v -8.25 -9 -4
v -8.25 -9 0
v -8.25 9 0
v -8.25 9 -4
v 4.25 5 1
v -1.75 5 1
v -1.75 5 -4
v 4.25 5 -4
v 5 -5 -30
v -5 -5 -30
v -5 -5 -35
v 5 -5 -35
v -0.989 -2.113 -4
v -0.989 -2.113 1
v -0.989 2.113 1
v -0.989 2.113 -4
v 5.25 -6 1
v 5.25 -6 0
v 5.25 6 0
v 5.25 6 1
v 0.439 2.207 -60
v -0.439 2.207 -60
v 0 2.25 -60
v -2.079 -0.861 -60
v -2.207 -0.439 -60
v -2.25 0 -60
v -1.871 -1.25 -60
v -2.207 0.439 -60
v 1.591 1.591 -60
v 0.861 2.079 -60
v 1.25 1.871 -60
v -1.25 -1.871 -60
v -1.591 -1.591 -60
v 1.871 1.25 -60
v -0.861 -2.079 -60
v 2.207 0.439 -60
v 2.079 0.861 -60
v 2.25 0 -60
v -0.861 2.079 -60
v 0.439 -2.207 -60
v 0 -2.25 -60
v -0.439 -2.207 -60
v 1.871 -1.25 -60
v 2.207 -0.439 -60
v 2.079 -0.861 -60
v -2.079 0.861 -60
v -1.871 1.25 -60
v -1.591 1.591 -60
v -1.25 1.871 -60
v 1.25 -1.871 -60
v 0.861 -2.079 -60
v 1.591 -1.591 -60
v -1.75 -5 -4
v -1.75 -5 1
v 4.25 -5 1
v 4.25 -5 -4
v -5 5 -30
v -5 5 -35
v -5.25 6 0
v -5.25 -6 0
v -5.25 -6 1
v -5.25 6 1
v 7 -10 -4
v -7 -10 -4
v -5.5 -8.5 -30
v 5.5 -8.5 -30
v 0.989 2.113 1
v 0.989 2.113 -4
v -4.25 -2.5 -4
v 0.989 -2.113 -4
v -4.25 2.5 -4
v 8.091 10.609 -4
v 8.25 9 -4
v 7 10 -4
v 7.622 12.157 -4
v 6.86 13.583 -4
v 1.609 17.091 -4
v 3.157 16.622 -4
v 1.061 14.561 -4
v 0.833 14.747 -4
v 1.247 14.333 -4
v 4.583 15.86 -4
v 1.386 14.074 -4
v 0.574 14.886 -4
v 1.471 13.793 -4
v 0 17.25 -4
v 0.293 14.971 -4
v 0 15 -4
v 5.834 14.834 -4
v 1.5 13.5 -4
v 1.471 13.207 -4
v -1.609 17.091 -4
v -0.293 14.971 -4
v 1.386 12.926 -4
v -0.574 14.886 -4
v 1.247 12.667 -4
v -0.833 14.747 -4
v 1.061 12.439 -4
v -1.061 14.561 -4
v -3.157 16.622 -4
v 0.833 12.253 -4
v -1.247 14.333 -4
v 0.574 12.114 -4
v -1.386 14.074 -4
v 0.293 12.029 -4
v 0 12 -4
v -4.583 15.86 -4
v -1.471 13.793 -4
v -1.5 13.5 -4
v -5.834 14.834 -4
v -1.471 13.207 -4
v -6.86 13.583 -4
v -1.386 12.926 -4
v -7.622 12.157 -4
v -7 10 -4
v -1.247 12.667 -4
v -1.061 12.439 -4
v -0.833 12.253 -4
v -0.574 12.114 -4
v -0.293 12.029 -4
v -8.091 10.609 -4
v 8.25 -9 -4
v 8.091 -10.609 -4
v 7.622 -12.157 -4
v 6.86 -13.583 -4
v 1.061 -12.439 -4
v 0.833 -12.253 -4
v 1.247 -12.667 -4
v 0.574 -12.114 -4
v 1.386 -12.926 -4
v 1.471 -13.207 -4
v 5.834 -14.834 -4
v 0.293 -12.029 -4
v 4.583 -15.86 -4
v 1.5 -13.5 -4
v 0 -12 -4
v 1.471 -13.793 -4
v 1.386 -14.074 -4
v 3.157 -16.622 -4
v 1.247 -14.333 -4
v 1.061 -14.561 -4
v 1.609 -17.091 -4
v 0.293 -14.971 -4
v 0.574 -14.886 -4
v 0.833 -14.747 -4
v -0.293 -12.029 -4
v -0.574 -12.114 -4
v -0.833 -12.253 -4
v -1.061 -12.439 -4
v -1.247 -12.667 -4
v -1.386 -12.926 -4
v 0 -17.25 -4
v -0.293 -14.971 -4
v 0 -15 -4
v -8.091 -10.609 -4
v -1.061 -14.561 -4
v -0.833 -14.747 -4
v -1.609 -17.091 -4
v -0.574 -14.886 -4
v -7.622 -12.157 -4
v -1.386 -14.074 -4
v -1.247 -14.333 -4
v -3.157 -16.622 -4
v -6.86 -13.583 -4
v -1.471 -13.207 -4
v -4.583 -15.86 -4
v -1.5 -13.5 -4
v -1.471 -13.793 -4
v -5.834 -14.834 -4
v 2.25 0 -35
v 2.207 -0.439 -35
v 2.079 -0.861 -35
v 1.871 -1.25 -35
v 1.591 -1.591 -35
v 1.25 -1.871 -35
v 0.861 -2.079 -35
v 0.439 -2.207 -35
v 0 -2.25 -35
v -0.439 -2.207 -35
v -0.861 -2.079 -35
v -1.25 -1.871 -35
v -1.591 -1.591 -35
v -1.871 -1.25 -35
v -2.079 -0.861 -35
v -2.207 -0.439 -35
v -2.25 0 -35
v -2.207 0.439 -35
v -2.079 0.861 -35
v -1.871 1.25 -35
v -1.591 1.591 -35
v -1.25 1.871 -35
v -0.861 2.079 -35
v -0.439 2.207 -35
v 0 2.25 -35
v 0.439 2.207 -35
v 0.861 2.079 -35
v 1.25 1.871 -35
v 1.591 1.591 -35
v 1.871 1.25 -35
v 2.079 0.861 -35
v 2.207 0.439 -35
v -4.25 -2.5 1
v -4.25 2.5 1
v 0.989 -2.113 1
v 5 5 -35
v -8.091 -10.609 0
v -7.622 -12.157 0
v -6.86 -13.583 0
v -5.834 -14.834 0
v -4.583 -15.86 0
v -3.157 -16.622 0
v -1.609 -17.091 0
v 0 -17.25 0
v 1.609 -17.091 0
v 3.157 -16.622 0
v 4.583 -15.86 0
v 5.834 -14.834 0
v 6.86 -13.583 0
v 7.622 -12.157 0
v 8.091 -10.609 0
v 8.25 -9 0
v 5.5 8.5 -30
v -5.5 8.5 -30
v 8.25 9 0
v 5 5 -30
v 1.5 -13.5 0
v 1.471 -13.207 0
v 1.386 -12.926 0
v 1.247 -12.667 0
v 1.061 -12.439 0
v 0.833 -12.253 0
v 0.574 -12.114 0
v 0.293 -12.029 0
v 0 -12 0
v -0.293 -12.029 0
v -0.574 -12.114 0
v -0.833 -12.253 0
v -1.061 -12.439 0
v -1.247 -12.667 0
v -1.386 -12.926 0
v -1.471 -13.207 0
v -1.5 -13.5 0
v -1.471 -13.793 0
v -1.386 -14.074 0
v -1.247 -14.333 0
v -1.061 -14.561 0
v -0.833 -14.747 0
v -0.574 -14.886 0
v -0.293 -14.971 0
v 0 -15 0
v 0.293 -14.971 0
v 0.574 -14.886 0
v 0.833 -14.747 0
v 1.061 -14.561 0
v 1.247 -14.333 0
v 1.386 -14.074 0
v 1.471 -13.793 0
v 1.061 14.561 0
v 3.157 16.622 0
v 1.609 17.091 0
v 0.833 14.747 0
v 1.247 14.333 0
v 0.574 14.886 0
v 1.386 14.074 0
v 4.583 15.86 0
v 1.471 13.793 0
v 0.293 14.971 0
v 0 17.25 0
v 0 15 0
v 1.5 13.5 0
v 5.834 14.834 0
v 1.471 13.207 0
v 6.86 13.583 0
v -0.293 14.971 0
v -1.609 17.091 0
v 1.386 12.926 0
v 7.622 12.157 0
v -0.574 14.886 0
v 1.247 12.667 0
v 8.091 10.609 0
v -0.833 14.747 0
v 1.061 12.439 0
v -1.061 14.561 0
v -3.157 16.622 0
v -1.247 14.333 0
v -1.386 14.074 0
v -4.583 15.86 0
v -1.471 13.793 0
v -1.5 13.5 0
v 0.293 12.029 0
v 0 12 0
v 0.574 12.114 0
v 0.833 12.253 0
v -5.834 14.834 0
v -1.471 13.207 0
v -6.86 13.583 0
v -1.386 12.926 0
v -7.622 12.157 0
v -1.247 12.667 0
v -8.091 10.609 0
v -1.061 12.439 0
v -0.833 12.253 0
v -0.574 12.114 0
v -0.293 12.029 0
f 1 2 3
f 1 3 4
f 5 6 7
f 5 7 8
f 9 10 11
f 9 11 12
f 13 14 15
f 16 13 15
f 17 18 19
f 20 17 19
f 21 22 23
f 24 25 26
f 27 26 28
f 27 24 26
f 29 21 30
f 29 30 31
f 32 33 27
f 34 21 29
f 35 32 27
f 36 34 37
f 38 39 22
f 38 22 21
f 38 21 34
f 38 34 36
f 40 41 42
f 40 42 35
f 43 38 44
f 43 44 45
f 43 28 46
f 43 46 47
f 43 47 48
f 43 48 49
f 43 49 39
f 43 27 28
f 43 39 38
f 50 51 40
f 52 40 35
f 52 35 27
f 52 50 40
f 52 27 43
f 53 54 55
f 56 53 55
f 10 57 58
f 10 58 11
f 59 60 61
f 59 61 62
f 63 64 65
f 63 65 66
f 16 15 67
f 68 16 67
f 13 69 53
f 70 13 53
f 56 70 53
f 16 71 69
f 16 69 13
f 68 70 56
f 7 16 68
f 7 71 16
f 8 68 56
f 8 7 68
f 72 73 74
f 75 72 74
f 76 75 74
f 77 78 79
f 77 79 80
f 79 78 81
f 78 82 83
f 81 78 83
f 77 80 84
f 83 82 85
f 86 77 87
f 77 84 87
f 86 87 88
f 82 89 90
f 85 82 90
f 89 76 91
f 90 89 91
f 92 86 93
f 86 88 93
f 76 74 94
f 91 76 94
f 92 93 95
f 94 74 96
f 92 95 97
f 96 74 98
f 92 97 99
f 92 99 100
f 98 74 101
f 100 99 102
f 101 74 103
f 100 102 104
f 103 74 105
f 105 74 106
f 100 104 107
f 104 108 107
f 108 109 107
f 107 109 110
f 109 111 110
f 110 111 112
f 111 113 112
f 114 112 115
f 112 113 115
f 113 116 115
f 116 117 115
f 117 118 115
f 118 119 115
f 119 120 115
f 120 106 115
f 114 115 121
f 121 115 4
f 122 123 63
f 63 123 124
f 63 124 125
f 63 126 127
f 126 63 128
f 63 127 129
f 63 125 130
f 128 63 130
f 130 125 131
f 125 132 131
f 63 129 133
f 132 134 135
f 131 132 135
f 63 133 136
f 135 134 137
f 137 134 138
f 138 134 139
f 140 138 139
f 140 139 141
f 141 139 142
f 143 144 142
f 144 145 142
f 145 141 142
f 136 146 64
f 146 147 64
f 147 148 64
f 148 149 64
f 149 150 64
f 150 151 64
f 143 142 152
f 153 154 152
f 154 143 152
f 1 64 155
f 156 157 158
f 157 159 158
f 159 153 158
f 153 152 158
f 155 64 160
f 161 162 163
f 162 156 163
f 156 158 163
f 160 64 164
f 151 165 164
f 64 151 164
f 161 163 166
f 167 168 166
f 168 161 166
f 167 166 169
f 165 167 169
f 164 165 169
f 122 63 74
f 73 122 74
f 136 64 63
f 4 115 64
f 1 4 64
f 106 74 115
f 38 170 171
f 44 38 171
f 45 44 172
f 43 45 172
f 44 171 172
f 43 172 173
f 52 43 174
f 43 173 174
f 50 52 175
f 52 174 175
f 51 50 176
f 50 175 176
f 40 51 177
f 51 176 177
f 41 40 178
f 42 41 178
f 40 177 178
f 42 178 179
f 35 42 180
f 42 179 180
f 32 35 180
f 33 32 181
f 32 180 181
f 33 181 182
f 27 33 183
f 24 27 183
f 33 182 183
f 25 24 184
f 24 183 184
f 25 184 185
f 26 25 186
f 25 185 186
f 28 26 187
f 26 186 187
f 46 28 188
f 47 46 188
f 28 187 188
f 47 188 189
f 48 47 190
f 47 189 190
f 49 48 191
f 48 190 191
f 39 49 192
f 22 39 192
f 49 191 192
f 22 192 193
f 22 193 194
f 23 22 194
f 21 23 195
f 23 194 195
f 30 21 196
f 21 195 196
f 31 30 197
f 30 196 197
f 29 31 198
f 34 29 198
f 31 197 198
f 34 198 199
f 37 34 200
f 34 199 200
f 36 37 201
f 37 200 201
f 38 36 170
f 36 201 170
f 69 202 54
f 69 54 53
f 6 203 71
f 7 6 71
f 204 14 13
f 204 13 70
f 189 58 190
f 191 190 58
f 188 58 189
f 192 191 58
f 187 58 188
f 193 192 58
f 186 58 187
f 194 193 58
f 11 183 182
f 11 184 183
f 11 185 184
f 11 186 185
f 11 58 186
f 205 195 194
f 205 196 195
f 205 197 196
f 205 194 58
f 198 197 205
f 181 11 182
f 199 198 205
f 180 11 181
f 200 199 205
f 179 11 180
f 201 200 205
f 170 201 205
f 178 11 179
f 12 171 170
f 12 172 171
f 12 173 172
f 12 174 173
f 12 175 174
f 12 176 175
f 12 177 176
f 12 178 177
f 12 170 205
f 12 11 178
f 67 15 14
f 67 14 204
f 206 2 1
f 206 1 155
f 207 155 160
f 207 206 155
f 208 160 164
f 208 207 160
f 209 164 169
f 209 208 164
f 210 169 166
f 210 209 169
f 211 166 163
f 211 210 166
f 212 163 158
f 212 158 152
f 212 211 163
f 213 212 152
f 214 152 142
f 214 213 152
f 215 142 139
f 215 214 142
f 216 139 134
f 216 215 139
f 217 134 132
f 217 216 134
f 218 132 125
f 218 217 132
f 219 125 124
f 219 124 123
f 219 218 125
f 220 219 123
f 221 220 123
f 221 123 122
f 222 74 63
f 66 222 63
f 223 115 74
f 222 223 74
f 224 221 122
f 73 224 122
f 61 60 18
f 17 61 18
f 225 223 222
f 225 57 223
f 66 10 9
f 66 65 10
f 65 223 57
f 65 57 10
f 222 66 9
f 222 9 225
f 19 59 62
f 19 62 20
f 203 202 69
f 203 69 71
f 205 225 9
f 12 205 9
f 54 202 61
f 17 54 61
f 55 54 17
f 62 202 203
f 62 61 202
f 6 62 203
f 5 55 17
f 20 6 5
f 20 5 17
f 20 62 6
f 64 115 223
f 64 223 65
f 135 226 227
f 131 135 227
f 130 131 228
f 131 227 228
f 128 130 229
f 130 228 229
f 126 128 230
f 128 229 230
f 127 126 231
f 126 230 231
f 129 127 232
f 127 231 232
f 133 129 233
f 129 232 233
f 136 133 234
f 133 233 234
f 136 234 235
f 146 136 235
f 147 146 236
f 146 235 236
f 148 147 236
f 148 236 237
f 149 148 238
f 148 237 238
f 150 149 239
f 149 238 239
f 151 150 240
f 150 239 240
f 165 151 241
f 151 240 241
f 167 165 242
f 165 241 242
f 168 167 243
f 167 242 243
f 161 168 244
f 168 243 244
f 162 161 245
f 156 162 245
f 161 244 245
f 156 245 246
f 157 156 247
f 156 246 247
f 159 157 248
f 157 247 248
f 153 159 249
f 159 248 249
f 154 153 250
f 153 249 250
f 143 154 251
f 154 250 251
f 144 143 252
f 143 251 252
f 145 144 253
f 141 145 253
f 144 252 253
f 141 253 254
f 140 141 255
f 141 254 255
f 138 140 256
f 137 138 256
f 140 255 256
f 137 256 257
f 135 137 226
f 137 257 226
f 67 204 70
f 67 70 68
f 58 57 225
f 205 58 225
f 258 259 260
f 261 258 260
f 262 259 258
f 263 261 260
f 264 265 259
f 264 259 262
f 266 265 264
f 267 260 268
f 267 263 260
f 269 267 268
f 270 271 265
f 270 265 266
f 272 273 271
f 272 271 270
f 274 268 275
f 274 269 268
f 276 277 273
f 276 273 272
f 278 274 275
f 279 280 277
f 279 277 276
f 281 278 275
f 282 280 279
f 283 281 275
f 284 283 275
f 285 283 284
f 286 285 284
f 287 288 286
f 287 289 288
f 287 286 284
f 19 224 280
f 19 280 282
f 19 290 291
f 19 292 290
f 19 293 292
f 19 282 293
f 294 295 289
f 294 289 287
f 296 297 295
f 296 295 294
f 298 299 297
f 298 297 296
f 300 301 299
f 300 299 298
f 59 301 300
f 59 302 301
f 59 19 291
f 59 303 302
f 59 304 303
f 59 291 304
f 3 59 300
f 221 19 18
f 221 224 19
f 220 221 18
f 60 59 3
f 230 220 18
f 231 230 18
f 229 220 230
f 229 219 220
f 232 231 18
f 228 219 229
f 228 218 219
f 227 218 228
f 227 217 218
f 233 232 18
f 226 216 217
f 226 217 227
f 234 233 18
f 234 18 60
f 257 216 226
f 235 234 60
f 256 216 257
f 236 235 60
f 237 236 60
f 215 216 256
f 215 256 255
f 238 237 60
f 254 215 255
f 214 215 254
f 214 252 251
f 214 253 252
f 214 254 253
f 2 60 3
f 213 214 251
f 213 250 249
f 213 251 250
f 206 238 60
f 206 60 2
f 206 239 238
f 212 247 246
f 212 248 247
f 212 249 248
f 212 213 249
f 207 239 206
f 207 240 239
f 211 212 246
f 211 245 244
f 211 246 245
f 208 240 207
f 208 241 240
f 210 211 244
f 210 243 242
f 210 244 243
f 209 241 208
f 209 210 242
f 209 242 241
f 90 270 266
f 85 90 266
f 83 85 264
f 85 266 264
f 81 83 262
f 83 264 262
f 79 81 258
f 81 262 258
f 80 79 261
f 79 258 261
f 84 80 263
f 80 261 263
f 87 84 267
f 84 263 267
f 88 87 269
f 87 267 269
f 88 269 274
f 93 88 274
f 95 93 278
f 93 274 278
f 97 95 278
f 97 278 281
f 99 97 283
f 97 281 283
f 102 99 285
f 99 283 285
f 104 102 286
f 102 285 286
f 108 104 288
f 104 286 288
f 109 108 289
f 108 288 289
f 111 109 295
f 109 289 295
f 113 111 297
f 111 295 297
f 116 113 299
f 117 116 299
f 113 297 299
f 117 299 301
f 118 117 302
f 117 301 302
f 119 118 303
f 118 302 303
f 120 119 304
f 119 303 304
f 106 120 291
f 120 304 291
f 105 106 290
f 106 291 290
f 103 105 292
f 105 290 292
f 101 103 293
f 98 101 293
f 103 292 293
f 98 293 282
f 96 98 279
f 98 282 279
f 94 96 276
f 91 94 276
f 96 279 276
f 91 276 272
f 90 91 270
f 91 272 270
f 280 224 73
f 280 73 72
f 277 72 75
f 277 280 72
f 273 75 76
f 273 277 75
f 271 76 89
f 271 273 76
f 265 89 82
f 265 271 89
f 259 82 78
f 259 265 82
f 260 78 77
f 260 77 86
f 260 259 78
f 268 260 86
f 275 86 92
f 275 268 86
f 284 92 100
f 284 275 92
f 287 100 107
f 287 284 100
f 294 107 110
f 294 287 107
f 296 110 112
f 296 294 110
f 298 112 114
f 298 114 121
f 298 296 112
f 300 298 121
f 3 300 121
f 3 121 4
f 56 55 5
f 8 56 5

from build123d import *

# Parameters (mm, degrees)
F0_R      = 1.5
F1_DEPTH  = 4
F2_W      = 14
F2_H      = 20
F3_DEPTH  = 26
F4_SIZE2  = 25.99999
F4_SIZE   = 1.49999
F5_W      = 10
F5_H      = 10
F6_DEPTH  = 5
F7_R      = 2.25
F8_DEPTH  = 25
F9_DEPTH  = 18
F10_W     = 10.5
F10_H     = 12
F11_DEPTH = 1
F13_W     = 8.5
F13_H     = 10
F13_W_2   = 1.9773303065
F13_H_2   = 4.2267278768
F14_DEPTH = 5
F15_SIZE  = 2.5


# Not quite as in the source:
# - a fillet or chamfer is up to 0.001 mm smaller than in the source, because OpenCascade refuses the exact size
# - a feature names something its author has since deleted; it is built from what else it names


with BuildPart() as f1:
    # F0 (on Top) → F1 (new body)
    with BuildSketch(Plane.XY):
        with BuildLine():
            Line((-8.25, 9), (8.25, 9))
            ThreePointArc((8.25, 9), (0, 17.25), (-8.25, 9))
        make_face()
        with Locations((0, 13.5)):
            Circle(F0_R, mode=Mode.SUBTRACT)
    extrude(amount=-F1_DEPTH)



with BuildPart() as f1b:
    # F0 (on Top) → F1, piece 2 (new body)
    with BuildSketch(Plane.XY):
        with BuildLine():
            ThreePointArc((-8.25, -9), (0, -17.25), (8.25, -9))
            Line((8.25, -9), (-8.25, -9))
        make_face()
        with Locations((0, -13.5)):
            Circle(F0_R, mode=Mode.SUBTRACT)
    extrude(amount=-F1_DEPTH)


with BuildPart() as f1_1:
    add(f1.part)

    add(f1b.part)  # F3 merges F1b
    # F2 (on face) → F3 (join)
    with BuildSketch(Plane(origin=(0, 0, -4), x_dir=(1, 0, 0), z_dir=(0, 0, -1))):
        Rectangle(F2_W, F2_H)
    extrude(amount=F3_DEPTH)

    # F4 (size 1.5 and 26 in the source; OpenCascade refuses exactly that, so slightly less here)
    f4_edges = [f1_1.edges().sort_by_distance(p)[0] for p in [
        (0, -10, -30),
        (0, 10, -30),
        (7, 0, -30),
        (-7, 0, -30),
    ]]
    f4_side = f1_1.faces().sort_by_distance((0, 0, -30))[0]
    chamfer(f4_edges, length=F4_SIZE, length2=F4_SIZE2, reference=f4_side)

    # F5 (on face) → F6 (join)
    with BuildSketch(Plane(origin=(0, 0, -30), x_dir=(1, 0, 0), z_dir=(0, 0, -1))):
        Rectangle(F5_W, F5_H)
    extrude(amount=F6_DEPTH)

    # F7 (on face) → F8 (join)
    with BuildSketch(Plane(origin=(0, 0, -35), x_dir=(1, 0, 0), z_dir=(0, 0, -1))):
        Circle(F7_R)
    extrude(amount=F8_DEPTH)

    # F9 (add): a face of the model
    f9_faces = [f1_1.faces().sort_by_distance(p)[0] for p in [
        (0, -9, -2),
    ]]
    extrude(f9_faces, amount=F9_DEPTH)

    # F10 (on face) → F11 (join)
    with BuildSketch(Plane.XY):
        Rectangle(F10_W, F10_H)
    extrude(amount=F11_DEPTH)

    # F13 (on face) → F14 (cut)
    with BuildSketch(Plane.XY.offset(1)):
        Rectangle(F13_W, F13_H)
        Rectangle(F13_W_2, F13_H_2, mode=Mode.SUBTRACT)
    extrude(amount=-F14_DEPTH, mode=Mode.SUBTRACT)

    # F15
    f15_edges = [f1_1.edges().sort_by_distance(p)[0] for p in [
        (-4.25, -5, -1.5),
        (-4.25, 5, -1.5),
    ]]
    chamfer(f15_edges, length=F15_SIZE)


solid = f1_1.part
